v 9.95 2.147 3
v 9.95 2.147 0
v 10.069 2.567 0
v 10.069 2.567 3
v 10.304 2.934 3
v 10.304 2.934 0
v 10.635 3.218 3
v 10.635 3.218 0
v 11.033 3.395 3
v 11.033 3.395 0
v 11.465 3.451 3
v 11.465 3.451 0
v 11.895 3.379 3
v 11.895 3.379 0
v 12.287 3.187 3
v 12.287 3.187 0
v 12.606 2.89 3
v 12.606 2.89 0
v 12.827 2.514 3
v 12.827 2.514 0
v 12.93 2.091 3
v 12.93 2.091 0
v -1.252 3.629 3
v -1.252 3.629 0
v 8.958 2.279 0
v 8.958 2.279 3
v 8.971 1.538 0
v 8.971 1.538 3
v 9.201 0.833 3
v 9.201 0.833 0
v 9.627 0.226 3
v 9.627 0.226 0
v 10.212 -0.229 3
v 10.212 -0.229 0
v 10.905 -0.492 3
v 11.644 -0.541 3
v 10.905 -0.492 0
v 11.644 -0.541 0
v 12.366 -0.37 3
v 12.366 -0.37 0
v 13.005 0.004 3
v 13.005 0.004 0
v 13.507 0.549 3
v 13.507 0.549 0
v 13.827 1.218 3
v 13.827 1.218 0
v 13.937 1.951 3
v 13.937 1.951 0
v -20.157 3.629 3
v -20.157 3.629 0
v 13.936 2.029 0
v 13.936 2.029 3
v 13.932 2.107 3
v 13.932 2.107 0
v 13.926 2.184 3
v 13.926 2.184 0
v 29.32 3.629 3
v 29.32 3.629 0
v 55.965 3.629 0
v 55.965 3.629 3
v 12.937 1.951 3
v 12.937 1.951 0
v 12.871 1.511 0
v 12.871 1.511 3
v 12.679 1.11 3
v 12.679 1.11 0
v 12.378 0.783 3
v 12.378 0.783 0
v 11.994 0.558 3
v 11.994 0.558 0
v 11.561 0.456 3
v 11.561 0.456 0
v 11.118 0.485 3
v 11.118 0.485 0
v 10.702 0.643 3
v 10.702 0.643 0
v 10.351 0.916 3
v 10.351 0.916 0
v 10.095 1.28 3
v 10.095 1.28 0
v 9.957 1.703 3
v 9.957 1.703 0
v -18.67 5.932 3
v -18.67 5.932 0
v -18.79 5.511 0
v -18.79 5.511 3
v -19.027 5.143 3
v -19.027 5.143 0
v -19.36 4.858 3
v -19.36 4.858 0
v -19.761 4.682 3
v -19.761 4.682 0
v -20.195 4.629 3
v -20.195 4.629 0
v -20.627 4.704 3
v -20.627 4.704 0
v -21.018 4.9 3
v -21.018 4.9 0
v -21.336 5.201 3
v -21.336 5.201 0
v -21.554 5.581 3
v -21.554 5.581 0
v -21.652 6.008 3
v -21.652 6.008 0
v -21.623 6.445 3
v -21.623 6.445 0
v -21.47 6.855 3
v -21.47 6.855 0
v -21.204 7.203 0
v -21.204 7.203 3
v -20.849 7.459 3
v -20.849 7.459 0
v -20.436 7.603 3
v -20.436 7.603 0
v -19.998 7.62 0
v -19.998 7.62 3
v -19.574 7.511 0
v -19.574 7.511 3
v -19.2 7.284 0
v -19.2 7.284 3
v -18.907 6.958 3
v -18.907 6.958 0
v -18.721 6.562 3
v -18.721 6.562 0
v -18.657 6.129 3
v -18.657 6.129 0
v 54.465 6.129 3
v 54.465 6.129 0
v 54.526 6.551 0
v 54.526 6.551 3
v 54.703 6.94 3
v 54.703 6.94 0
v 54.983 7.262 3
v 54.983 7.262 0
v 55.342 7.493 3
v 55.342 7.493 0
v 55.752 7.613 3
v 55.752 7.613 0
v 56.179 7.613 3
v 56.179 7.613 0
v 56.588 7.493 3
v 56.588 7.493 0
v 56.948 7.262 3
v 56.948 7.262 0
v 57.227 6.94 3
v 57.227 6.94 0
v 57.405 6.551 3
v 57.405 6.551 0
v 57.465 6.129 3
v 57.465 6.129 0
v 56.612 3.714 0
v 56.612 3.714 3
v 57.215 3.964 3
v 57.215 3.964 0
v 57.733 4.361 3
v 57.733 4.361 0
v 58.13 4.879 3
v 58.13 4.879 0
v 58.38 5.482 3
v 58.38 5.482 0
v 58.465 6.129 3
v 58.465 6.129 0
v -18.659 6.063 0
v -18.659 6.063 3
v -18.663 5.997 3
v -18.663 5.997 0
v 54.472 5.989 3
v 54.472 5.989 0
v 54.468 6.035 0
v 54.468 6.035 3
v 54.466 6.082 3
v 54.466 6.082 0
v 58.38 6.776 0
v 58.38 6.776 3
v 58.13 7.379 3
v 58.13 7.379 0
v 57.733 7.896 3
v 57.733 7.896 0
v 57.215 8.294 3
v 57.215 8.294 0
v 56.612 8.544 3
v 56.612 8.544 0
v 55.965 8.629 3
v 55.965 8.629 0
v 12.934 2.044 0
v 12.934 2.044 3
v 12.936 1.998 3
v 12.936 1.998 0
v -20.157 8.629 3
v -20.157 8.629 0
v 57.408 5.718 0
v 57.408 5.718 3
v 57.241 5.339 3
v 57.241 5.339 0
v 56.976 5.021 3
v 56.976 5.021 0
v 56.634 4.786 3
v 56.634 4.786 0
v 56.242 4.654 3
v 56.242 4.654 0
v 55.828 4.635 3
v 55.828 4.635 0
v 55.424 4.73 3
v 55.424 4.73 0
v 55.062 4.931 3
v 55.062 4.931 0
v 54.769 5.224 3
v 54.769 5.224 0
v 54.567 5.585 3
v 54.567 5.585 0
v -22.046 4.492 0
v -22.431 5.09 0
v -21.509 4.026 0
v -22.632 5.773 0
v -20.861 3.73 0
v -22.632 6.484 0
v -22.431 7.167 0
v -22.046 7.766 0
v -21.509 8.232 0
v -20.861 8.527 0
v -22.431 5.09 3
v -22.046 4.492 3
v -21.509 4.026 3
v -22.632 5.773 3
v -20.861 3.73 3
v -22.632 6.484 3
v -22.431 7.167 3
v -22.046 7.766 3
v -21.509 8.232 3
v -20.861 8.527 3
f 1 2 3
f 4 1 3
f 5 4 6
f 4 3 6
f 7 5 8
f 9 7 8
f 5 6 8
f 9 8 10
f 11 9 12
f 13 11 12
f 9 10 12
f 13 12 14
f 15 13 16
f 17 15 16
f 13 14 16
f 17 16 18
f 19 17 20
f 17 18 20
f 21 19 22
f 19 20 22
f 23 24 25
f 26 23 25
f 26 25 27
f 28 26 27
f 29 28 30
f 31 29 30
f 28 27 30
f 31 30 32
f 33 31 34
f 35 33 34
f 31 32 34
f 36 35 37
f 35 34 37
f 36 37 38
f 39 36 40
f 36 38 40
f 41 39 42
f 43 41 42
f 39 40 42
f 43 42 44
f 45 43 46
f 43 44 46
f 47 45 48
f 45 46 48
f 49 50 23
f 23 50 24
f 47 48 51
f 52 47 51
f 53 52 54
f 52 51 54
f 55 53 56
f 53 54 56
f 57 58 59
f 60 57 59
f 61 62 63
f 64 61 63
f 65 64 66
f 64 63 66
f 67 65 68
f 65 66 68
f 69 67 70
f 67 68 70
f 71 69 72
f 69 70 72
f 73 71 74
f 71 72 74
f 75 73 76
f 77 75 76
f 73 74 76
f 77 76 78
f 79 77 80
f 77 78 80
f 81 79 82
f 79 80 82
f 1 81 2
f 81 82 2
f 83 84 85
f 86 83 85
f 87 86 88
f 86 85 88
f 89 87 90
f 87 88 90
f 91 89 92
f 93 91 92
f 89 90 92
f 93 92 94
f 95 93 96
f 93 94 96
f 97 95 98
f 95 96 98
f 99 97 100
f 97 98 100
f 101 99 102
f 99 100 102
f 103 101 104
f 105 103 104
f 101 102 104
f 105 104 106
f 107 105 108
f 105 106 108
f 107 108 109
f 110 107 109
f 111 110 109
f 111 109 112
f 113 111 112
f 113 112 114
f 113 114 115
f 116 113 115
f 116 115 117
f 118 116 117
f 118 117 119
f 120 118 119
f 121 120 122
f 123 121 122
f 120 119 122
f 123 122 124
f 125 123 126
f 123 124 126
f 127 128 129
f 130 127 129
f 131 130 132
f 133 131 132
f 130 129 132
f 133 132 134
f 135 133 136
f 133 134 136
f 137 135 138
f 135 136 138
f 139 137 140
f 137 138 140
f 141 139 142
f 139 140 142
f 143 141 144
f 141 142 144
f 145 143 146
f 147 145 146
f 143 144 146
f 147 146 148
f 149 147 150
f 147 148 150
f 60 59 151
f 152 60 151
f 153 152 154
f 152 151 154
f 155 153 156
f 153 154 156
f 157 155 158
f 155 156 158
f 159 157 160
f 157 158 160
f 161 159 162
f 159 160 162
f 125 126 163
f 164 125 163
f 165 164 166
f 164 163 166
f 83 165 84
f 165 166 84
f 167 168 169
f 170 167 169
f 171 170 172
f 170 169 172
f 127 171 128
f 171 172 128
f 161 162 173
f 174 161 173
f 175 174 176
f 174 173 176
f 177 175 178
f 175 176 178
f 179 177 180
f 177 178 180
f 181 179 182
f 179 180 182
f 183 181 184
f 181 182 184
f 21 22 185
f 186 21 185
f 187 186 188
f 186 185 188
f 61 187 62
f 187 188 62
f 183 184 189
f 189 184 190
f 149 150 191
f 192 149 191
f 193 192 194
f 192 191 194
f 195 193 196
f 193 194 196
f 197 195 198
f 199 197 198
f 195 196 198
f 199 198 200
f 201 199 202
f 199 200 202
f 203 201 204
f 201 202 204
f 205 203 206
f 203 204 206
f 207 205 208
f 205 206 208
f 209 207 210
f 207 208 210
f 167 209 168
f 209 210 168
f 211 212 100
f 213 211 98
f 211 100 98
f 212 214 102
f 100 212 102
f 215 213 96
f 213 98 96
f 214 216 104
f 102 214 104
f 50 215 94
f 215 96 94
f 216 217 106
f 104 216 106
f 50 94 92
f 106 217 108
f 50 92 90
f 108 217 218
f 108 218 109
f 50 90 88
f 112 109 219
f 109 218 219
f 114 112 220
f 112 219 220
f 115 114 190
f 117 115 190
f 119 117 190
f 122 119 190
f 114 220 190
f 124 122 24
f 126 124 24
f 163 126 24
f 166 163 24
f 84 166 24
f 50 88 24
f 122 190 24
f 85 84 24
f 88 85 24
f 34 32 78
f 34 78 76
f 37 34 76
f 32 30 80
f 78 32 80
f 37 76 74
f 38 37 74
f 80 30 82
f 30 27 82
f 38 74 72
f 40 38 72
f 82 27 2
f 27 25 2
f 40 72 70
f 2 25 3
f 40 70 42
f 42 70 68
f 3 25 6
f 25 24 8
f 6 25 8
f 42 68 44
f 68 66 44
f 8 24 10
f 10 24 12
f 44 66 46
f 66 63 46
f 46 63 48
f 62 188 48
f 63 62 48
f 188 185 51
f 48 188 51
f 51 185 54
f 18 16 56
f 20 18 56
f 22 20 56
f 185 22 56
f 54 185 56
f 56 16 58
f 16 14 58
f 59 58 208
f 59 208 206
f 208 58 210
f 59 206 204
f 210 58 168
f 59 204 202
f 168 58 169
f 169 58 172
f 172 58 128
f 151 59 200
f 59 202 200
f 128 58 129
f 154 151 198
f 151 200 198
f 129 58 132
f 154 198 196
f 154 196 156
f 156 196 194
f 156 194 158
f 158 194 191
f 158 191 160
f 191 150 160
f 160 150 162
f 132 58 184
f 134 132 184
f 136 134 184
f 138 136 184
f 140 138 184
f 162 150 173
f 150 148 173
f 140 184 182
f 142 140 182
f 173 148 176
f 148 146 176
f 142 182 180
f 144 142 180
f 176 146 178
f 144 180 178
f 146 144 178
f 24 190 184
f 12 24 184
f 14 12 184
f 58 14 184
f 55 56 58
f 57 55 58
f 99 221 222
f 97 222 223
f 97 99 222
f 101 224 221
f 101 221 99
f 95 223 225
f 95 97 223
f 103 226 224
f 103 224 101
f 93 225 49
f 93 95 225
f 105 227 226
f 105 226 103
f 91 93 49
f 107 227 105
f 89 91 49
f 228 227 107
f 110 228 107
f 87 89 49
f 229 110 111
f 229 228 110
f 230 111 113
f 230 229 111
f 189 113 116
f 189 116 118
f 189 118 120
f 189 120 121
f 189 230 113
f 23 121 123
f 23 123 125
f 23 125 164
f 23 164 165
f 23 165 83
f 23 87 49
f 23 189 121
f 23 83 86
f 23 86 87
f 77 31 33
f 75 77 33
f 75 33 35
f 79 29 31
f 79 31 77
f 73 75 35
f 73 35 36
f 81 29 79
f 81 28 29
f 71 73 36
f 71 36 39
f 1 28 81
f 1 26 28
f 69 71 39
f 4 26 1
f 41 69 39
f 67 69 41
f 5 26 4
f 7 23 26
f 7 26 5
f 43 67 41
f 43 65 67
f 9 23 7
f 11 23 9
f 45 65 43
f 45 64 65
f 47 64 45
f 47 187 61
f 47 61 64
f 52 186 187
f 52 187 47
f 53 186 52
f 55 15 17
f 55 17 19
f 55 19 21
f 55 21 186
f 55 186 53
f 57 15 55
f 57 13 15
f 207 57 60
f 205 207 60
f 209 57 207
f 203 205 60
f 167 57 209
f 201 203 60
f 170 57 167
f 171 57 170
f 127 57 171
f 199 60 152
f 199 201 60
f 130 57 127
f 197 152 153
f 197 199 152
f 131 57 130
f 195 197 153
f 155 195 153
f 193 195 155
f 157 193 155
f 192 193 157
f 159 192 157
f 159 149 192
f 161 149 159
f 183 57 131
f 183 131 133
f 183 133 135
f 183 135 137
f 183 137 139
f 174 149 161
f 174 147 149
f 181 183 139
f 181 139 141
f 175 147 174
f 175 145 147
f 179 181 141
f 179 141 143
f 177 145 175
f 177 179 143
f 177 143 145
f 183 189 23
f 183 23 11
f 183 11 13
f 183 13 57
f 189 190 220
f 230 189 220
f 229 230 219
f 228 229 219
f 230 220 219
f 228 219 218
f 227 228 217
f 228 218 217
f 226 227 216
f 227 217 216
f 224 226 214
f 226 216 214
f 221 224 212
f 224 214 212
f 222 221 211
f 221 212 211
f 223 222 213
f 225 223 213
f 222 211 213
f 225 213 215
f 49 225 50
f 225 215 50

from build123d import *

# Parameters (mm, degrees)
F1_DEPTH = 3


# Not quite as in the source:
# - a feature of the source that left no trace in its solid (it failed there, or was rolled back) is left out


with BuildPart() as f1:
    # F0 (on Top) → F1 (new body)
    with BuildSketch(Plane.XY):
        with BuildLine():
            ThreePointArc((-20.1571040975, 8.6286983024), (-18.3893371446, 7.8964652554), (-17.6571040975, 6.1286983024))
            Line((-17.6571040975, 6.1286983024), (53.465291932, 6.1286983024))
            ThreePointArc((53.465291932, 6.1286983024), (54.1975249791, 7.8964652554), (55.965291932, 8.6286983024))
            Line((55.965291932, 8.6286983024), (-20.1571040975, 8.6286983024))
        make_face()
        with BuildLine():
            Line((-18.6571040975, 6.1286983024), (-17.6571040975, 6.1286983024))
            ThreePointArc((-17.6571040975, 6.1286983024), (-18.3893371446, 7.8964652554), (-20.1571040975, 8.6286983024))
            ThreePointArc((-20.1571040975, 8.6286983024), (-22.6571040975, 6.1286983024), (-20.1571040975, 3.6286983024))
            ThreePointArc((-20.1571040975, 3.6286983024), (-18.5092794047, 4.2486254895), (-17.6786797732, 5.800959277))
            Line((-17.6786797732, 5.800959277), (-18.670049503, 5.9320548872))
            ThreePointArc((-18.670049503, 5.9320548872), (-21.6538642473, 6.2272328348), (-18.6571040975, 6.1286983024))
        make_face()
        with BuildLine():
            Line((53.465291932, 6.1286983024), (-17.6571040975, 6.1286983024))
            ThreePointArc((-17.6571040975, 6.1286983024), (-17.6625038479, 5.9644740818), (-17.6786797732, 5.800959277))
            Line((-17.6786797732, 5.800959277), (-1.2516325751, 3.6286983024))
            Line((-1.2516325751, 3.6286983024), (9.58356384, 3.6286983024))
            ThreePointArc((9.58356384, 3.6286983024), (11.4368578188, 4.4508123027), (13.2901517977, 3.6286983024))
            Line((13.2901517977, 3.6286983024), (29.319977701, 3.6286983024))
            Line((29.319977701, 3.6286983024), (53.476223752, 5.8951611635))
            ThreePointArc((53.476223752, 5.8951611635), (53.4680263825, 6.011801874), (53.465291932, 6.1286983024))
        make_face()
        with BuildLine():
            ThreePointArc((55.965291932, 8.6286983024), (54.1975249791, 7.8964652554), (53.465291932, 6.1286983024))
            Line((53.465291932, 6.1286983024), (54.465291932, 6.1286983024))
            ThreePointArc((54.465291932, 6.1286983024), (55.965291932, 7.6286983024), (57.465291932, 6.1286983024))
            ThreePointArc((57.465291932, 6.1286983024), (56.0354297891, 4.6303389727), (54.471851024, 5.9885760191))
            Line((54.471851024, 5.9885760191), (53.476223752, 5.8951611635))
            ThreePointArc((53.476223752, 5.8951611635), (54.2821167848, 4.2802066406), (55.965291932, 3.6286983024))
            ThreePointArc((55.965291932, 3.6286983024), (57.733058885, 4.3609313494), (58.465291932, 6.1286983024))
            ThreePointArc((58.465291932, 6.1286983024), (57.733058885, 7.8964652554), (55.965291932, 8.6286983024))
        make_face()
        with BuildLine():
            Line((-1.2516325751, 3.6286983024), (-17.6786797732, 5.800959277))
            ThreePointArc((-17.6786797732, 5.800959277), (-18.5092794047, 4.2486254895), (-20.1571040975, 3.6286983024))
            Line((-20.1571040975, 3.6286983024), (-1.2516325751, 3.6286983024))
        make_face()
        with BuildLine():
            ThreePointArc((55.965291932, 3.6286983024), (54.2821167848, 4.2802066406), (53.476223752, 5.8951611635))
            Line((53.476223752, 5.8951611635), (29.319977701, 3.6286983024))
            Line((29.319977701, 3.6286983024), (55.965291932, 3.6286983024))
        make_face()
        with BuildLine():
            Line((9.58356384, 3.6286983024), (-1.2516325751, 3.6286983024))
            Line((-1.2516325751, 3.6286983024), (8.9584334945, 2.2785513281))
            ThreePointArc((8.9584334945, 2.2785513281), (9.1682304635, 3.0012074295), (9.58356384, 3.6286983024))
        make_face()
        with BuildLine():
            Line((13.9259259989, 2.1843494416), (29.319977701, 3.6286983024))
            Line((29.319977701, 3.6286983024), (13.2901517977, 3.6286983024))
            ThreePointArc((13.2901517977, 3.6286983024), (13.7249931268, 2.9580048426), (13.9259259989, 2.1843494416))
        make_face()
        with BuildLine():
            ThreePointArc((9.58356384, 3.6286983024), (9.1682304635, 3.0012074295), (8.9584334945, 2.2785513281))
            Line((8.9584334945, 2.2785513281), (9.9498032243, 2.1474557179))
            ThreePointArc((9.9498032243, 2.1474557179), (11.4652982098, 3.4505426599), (12.9302987268, 2.090934586))
            Line((12.9302987268, 2.090934586), (13.9259259989, 2.1843494416))
            ThreePointArc((13.9259259989, 2.1843494416), (13.7249931268, 2.9580048426), (13.2901517977, 3.6286983024))
            Line((13.2901517977, 3.6286983024), (9.58356384, 3.6286983024))
        make_face()
        with BuildLine():
            Line((9.9498032243, 2.1474557179), (8.9584334945, 2.2785513281))
            ThreePointArc((8.9584334945, 2.2785513281), (11.2726335982, -0.5437879469), (13.9368578188, 1.9508123027))
            ThreePointArc((13.9368578188, 1.9508123027), (13.9341233684, 2.0677087311), (13.9259259989, 2.1843494416))
            Line((13.9259259989, 2.1843494416), (12.9302987268, 2.090934586))
            ThreePointArc((12.9302987268, 2.090934586), (12.9352171486, 2.0209501598), (12.9368578188, 1.9508123027))
            ThreePointArc((12.9368578188, 1.9508123027), (11.3383232865, 0.4540521529), (9.9498032243, 2.1474557179))
        make_face()
        with BuildLine():
            ThreePointArc((13.2901517977, 3.6286983024), (11.4368578188, 4.4508123027), (9.58356384, 3.6286983024))
            Line((9.58356384, 3.6286983024), (13.2901517977, 3.6286983024))
        make_face()
        with BuildLine():
            ThreePointArc((-17.6786797732, 5.800959277), (-17.6625038479, 5.9644740818), (-17.6571040975, 6.1286983024))
            Line((-17.6571040975, 6.1286983024), (-18.6571040975, 6.1286983024))
            ThreePointArc((-18.6571040975, 6.1286983024), (-18.6603439478, 6.03016377), (-18.670049503, 5.9320548872))
            Line((-18.670049503, 5.9320548872), (-17.6786797732, 5.800959277))
        make_face()
        with BuildLine():
            Line((54.465291932, 6.1286983024), (53.465291932, 6.1286983024))
            ThreePointArc((53.465291932, 6.1286983024), (53.4680263825, 6.011801874), (53.476223752, 5.8951611635))
            Line((53.476223752, 5.8951611635), (54.471851024, 5.9885760191))
            ThreePointArc((54.471851024, 5.9885760191), (54.4669326023, 6.0585604453), (54.465291932, 6.1286983024))
        make_face()
    extrude(amount=F1_DEPTH)


solid = f1.part
